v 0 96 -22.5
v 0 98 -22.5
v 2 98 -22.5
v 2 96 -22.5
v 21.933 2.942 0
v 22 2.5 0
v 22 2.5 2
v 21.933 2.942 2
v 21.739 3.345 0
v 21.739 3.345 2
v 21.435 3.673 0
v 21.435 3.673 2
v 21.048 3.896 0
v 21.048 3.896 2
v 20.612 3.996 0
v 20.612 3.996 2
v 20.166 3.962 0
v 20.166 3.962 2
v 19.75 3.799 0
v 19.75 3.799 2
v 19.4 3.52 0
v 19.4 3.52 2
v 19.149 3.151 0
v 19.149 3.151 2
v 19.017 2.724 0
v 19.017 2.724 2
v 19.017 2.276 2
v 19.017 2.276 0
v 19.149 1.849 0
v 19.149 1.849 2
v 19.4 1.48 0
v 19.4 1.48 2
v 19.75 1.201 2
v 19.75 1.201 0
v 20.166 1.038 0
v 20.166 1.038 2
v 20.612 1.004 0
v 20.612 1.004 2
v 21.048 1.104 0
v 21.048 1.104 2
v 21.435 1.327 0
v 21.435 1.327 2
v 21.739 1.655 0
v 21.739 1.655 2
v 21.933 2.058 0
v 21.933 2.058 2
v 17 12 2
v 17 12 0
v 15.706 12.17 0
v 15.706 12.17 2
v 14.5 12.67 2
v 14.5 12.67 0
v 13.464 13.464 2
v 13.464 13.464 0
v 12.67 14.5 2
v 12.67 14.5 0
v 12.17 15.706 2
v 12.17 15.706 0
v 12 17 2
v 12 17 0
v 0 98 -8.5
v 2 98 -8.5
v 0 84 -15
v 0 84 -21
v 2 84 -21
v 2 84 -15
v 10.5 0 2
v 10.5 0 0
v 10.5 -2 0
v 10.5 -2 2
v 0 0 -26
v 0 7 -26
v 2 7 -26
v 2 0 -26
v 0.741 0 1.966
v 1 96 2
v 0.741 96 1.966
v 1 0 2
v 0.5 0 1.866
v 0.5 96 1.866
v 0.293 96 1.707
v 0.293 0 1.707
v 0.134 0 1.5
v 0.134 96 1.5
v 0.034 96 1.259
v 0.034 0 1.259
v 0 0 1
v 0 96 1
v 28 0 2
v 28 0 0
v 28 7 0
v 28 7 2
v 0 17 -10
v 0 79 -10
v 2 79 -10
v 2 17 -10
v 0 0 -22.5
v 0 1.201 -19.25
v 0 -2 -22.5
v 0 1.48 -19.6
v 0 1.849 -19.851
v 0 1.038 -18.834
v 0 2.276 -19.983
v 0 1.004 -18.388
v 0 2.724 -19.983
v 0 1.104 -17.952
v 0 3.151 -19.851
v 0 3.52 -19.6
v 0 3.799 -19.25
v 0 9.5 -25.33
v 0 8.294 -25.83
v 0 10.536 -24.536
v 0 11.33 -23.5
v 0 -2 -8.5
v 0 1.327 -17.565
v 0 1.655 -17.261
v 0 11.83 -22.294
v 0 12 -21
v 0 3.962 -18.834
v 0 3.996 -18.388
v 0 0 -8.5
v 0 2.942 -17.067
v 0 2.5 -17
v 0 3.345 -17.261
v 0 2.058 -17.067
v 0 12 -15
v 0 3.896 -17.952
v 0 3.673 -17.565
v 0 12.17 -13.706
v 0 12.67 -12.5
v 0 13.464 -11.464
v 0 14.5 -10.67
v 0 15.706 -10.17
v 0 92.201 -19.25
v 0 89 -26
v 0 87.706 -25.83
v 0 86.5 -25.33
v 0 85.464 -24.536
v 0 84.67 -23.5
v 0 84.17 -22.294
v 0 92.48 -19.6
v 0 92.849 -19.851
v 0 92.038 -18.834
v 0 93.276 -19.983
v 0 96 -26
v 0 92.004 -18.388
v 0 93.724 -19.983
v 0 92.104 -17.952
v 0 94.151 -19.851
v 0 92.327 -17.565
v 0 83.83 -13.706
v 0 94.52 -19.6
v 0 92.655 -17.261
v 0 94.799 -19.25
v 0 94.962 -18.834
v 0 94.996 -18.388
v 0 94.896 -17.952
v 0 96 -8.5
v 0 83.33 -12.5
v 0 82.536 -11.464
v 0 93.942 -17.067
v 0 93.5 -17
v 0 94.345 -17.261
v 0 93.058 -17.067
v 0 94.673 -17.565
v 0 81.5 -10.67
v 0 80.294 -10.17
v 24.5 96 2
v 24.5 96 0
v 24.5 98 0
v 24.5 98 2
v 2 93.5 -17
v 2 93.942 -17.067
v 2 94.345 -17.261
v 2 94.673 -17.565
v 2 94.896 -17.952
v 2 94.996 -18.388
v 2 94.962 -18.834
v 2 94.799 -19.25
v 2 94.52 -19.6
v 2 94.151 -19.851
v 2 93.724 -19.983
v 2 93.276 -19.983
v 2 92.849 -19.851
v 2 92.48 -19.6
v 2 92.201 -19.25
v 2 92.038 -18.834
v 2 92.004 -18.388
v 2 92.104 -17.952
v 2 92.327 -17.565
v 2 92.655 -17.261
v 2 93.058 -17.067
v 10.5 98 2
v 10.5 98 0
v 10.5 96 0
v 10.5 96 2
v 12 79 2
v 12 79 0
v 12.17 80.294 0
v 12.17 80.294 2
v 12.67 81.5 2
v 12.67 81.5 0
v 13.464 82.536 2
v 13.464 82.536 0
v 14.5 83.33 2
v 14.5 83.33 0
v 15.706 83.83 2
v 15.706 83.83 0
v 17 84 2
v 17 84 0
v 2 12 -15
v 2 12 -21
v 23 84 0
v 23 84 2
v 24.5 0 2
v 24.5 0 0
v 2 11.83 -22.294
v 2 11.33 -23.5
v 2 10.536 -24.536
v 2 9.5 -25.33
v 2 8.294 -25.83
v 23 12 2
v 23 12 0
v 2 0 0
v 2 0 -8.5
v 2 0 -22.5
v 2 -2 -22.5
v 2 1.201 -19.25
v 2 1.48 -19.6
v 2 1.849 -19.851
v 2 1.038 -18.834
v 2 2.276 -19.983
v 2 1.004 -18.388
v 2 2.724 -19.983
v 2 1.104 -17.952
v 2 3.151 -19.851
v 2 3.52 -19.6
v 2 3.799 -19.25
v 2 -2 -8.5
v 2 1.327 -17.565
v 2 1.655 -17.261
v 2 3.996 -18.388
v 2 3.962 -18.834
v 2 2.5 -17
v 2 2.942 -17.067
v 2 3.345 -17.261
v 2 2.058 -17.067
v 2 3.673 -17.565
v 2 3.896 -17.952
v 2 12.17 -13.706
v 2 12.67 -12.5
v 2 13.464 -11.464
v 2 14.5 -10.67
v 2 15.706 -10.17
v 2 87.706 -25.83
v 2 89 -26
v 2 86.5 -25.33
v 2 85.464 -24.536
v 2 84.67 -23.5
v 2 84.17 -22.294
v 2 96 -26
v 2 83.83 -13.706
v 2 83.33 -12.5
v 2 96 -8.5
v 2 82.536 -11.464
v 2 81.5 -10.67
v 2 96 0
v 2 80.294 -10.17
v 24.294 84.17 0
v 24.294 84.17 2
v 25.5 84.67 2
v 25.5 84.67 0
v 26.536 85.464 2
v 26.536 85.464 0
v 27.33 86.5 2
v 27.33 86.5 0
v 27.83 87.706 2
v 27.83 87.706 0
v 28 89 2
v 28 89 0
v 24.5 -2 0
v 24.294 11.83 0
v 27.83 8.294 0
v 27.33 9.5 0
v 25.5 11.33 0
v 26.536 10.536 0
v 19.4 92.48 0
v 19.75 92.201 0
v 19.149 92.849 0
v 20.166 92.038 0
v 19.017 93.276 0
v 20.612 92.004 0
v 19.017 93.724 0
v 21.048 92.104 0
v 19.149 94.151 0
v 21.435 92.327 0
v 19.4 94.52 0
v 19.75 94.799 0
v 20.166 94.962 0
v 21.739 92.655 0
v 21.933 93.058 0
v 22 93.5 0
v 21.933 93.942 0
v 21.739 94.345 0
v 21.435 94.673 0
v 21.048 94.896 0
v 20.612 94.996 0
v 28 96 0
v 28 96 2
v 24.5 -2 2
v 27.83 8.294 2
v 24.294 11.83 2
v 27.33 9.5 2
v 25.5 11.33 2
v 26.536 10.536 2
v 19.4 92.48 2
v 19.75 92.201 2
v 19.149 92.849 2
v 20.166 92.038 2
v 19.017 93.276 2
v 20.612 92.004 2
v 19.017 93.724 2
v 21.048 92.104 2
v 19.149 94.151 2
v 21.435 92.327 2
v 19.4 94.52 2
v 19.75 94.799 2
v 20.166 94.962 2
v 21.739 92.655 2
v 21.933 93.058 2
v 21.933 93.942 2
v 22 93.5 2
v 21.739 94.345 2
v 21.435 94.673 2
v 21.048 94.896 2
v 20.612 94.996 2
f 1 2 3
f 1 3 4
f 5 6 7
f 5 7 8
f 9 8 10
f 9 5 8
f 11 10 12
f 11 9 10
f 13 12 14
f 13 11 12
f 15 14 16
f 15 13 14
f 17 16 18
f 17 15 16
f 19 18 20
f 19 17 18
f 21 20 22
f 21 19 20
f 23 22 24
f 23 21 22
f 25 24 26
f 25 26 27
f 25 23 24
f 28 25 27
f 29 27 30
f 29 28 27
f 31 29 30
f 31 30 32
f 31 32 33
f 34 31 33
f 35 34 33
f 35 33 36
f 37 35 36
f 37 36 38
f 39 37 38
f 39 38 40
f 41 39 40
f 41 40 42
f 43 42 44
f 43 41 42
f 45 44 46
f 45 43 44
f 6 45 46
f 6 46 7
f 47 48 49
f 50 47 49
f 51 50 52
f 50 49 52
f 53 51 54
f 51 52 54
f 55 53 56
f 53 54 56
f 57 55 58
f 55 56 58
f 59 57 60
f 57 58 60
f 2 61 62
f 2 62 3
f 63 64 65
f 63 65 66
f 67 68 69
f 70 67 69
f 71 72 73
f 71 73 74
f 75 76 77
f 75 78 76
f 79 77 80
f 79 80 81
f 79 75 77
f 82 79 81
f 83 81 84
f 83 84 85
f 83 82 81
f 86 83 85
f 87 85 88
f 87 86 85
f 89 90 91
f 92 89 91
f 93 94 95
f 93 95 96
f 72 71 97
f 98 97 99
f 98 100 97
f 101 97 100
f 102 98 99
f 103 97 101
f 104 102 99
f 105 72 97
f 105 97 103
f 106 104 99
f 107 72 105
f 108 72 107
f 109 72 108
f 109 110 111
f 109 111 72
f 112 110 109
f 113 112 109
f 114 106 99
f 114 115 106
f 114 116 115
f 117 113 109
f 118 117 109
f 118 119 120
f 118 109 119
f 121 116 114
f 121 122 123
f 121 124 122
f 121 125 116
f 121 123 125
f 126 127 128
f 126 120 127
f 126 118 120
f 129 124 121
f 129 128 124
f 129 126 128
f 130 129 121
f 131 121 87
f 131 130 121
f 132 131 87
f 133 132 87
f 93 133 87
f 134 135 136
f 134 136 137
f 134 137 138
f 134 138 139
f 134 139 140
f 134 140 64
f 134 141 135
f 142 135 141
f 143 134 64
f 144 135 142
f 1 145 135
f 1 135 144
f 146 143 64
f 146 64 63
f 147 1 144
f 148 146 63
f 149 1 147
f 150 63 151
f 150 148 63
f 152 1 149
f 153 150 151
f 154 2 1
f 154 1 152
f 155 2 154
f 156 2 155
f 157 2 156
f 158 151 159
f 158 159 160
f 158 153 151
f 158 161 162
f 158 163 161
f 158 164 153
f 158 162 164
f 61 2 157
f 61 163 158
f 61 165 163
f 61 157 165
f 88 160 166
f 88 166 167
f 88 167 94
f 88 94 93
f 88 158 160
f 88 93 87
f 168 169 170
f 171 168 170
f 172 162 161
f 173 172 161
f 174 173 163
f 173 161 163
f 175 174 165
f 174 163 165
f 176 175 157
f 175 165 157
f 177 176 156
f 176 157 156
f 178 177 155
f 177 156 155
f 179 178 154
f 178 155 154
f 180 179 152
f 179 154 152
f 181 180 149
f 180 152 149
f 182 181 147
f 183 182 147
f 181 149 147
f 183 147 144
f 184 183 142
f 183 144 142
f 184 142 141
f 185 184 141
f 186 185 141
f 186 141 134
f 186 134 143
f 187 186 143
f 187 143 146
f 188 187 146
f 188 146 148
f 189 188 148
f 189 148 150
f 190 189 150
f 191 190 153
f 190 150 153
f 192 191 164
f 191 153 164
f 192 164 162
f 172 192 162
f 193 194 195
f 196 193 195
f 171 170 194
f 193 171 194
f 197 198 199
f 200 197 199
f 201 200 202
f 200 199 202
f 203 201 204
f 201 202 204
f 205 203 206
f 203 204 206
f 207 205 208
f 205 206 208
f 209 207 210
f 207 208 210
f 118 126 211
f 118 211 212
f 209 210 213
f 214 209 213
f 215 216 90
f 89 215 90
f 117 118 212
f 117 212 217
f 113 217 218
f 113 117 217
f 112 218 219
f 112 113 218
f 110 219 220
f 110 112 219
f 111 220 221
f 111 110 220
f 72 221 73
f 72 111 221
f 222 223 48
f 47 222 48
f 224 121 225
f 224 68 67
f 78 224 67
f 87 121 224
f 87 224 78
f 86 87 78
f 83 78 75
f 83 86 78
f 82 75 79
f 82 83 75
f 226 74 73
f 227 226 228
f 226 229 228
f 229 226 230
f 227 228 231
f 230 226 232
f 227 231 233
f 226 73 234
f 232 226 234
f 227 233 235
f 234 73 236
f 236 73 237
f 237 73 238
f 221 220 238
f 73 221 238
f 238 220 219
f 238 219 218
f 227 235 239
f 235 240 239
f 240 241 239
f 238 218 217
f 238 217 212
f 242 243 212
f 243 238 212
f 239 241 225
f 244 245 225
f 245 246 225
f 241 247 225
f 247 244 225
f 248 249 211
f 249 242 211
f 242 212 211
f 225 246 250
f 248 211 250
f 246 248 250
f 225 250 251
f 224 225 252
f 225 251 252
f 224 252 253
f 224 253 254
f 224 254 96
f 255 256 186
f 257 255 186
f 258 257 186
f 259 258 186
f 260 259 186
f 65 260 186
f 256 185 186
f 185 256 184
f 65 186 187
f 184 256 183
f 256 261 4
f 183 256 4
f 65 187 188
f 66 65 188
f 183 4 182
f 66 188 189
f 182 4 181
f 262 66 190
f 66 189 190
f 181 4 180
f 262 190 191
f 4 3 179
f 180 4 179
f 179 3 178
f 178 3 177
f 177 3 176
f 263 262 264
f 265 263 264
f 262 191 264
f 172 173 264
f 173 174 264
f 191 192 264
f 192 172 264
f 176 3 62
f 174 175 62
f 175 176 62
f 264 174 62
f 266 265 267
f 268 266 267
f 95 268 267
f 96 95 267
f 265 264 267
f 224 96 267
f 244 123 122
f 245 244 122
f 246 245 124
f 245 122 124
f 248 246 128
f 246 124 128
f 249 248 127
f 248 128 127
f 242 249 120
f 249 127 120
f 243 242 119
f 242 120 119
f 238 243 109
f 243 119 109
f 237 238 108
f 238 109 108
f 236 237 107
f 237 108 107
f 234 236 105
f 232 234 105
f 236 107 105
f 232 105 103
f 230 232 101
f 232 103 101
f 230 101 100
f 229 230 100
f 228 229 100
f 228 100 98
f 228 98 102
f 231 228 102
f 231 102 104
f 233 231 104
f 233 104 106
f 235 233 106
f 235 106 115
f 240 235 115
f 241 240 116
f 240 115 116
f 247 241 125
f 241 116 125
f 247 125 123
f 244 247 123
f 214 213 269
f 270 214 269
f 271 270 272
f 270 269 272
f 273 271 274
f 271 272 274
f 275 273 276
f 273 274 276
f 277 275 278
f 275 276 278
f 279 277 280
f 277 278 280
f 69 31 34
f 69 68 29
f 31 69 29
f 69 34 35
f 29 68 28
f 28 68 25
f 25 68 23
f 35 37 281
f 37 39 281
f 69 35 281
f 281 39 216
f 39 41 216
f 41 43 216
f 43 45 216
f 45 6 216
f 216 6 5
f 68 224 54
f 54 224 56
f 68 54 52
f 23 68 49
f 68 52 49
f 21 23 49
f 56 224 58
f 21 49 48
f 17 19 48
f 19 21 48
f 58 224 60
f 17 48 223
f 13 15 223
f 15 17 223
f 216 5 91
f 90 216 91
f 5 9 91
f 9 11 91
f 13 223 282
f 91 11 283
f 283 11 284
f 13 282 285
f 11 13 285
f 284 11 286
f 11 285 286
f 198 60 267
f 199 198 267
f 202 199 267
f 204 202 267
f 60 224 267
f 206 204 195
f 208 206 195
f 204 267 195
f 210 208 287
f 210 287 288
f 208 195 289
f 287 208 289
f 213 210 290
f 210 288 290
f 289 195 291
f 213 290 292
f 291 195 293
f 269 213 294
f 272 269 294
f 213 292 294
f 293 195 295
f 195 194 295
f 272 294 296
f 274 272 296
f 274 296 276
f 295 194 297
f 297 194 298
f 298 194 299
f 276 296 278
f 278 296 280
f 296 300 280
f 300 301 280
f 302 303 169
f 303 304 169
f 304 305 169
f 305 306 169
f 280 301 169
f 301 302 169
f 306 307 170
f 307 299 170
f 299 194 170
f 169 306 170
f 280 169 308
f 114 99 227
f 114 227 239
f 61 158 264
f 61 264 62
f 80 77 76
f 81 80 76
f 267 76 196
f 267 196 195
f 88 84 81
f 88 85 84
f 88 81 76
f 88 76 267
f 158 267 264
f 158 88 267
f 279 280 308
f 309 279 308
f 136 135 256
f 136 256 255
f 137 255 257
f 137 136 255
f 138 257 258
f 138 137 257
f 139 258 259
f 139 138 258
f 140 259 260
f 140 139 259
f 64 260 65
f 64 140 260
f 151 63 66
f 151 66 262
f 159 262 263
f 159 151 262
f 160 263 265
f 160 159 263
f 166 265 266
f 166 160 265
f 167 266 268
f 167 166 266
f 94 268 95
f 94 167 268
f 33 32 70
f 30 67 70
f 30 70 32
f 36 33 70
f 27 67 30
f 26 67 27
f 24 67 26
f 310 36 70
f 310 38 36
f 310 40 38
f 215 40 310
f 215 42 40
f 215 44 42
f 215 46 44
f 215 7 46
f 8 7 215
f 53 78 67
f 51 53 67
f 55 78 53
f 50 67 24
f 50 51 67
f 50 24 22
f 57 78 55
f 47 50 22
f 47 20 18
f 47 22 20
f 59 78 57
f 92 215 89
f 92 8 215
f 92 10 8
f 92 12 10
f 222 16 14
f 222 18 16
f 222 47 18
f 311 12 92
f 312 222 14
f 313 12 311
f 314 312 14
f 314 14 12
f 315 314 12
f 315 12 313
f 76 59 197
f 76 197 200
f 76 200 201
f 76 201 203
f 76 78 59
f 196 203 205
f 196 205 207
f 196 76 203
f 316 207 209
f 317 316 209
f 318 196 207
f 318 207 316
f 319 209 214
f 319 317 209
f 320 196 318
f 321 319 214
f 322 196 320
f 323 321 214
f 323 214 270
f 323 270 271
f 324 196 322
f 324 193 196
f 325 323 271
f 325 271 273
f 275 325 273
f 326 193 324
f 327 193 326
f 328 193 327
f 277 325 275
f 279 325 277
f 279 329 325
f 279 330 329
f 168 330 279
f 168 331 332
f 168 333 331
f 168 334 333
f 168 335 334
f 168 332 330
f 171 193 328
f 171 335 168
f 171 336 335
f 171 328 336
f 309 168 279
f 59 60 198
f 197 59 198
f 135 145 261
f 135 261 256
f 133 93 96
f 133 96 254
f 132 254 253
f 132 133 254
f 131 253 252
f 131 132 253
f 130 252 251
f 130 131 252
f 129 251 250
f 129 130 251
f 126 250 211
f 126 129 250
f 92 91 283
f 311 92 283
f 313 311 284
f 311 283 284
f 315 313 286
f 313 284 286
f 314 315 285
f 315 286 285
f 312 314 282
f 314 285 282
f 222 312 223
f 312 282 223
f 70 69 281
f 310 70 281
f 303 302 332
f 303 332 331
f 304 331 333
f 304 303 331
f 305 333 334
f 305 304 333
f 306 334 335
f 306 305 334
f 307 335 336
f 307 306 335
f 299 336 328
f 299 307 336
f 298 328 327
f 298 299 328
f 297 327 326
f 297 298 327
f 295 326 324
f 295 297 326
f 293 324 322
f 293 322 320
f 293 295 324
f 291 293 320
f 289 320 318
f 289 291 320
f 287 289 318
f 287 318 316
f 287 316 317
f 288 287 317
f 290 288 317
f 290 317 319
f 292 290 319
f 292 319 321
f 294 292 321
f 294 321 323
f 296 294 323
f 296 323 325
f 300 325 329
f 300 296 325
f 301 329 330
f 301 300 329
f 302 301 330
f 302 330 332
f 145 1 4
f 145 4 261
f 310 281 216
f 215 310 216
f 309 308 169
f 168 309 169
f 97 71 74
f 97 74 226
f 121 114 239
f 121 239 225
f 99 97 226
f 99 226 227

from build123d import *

# Parameters (mm, degrees)
SKETCH1_R           = 1.5
BOSS_EXTRUDE1_DEPTH = 2
SKETCH2_R           = 1.5
BOSS_EXTRUDE2_DEPTH = 2
FILLET1_R           = 1


with BuildPart() as part:
    # Sketch1 → Boss-Extrude1 (new body)
    with BuildSketch(Plane.XY):
        with BuildLine():
            Line((0, 96), (0, 0))
            Line((0, 0), (10.5, 0))
            Line((10.5, 0), (10.5, -2))
            Line((10.5, -2), (24.5, -2))
            Line((24.5, -2), (24.5, 0))
            Line((24.5, 0), (28, 0))
            Line((28, 0), (28, 7))
            ThreePointArc((28, 7), (26.535533906, 10.535533906), (23, 12))
            Line((23, 12), (17, 12))
            ThreePointArc((17, 12), (13.464466094, 13.464466094), (12, 17))
            Line((12, 17), (12, 79))
            ThreePointArc((12, 79), (13.464466094, 82.535533906), (17, 84))
            Line((17, 84), (23, 84))
            ThreePointArc((23, 84), (26.535533906, 85.464466094), (28, 89))
            Line((28, 89), (28, 96))
            Line((28, 96), (24.5, 96))
            Line((24.5, 96), (24.5, 98))
            Line((24.5, 98), (10.5, 98))
            Line((10.5, 98), (10.5, 96))
            Line((10.5, 96), (0, 96))
        make_face()
        with Locations((20.5, 2.5)):
            Circle(SKETCH1_R, mode=Mode.SUBTRACT)
        with Locations((20.5, 93.5)):
            Circle(SKETCH1_R, mode=Mode.SUBTRACT)
    extrude(amount=BOSS_EXTRUDE1_DEPTH)

    # Sketch2 → Boss-Extrude2 (add)
    with BuildSketch(Plane.ZY):
        with BuildLine():
            Line((0, 96), (-8.5, 96))
            Line((-8.5, 96), (-8.5, 98))
            Line((-8.5, 98), (-22.5, 98))
            Line((-22.5, 98), (-22.5, 96))
            Line((-22.5, 96), (-26, 96))
            Line((-26, 96), (-26, 89))
            ThreePointArc((-26, 89), (-24.535533906, 85.464466094), (-21, 84))
            Line((-21, 84), (-15, 84))
            ThreePointArc((-15, 84), (-11.464466094, 82.535533906), (-10, 79))
            Line((-10, 79), (-10, 17))
            ThreePointArc((-10, 17), (-11.464466094, 13.464466094), (-15, 12))
            Line((-15, 12), (-21, 12))
            ThreePointArc((-21, 12), (-24.535533906, 10.535533906), (-26, 7))
            Line((-26, 7), (-26, 0))
            Line((-26, 0), (-22.5, 0))
            Line((-22.5, 0), (-22.5, -2))
            Line((-22.5, -2), (-8.5, -2))
            Line((-8.5, -2), (-8.5, 0))
            Line((-8.5, 0), (0, 0))
            Line((0, 0), (0, 96))
        make_face()
        with Locations((-18.5, 93.5)):
            Circle(SKETCH2_R, mode=Mode.SUBTRACT)
        with Locations((-18.5, 2.5)):
            Circle(SKETCH2_R, mode=Mode.SUBTRACT)
    extrude(amount=-BOSS_EXTRUDE2_DEPTH)

    # Fillet1
    fillet1_edges = [part.edges().sort_by_distance(p)[0] for p in [
        (0, 48, 2),
    ]]
    fillet(fillet1_edges, radius=FILLET1_R)


solid = part.part
